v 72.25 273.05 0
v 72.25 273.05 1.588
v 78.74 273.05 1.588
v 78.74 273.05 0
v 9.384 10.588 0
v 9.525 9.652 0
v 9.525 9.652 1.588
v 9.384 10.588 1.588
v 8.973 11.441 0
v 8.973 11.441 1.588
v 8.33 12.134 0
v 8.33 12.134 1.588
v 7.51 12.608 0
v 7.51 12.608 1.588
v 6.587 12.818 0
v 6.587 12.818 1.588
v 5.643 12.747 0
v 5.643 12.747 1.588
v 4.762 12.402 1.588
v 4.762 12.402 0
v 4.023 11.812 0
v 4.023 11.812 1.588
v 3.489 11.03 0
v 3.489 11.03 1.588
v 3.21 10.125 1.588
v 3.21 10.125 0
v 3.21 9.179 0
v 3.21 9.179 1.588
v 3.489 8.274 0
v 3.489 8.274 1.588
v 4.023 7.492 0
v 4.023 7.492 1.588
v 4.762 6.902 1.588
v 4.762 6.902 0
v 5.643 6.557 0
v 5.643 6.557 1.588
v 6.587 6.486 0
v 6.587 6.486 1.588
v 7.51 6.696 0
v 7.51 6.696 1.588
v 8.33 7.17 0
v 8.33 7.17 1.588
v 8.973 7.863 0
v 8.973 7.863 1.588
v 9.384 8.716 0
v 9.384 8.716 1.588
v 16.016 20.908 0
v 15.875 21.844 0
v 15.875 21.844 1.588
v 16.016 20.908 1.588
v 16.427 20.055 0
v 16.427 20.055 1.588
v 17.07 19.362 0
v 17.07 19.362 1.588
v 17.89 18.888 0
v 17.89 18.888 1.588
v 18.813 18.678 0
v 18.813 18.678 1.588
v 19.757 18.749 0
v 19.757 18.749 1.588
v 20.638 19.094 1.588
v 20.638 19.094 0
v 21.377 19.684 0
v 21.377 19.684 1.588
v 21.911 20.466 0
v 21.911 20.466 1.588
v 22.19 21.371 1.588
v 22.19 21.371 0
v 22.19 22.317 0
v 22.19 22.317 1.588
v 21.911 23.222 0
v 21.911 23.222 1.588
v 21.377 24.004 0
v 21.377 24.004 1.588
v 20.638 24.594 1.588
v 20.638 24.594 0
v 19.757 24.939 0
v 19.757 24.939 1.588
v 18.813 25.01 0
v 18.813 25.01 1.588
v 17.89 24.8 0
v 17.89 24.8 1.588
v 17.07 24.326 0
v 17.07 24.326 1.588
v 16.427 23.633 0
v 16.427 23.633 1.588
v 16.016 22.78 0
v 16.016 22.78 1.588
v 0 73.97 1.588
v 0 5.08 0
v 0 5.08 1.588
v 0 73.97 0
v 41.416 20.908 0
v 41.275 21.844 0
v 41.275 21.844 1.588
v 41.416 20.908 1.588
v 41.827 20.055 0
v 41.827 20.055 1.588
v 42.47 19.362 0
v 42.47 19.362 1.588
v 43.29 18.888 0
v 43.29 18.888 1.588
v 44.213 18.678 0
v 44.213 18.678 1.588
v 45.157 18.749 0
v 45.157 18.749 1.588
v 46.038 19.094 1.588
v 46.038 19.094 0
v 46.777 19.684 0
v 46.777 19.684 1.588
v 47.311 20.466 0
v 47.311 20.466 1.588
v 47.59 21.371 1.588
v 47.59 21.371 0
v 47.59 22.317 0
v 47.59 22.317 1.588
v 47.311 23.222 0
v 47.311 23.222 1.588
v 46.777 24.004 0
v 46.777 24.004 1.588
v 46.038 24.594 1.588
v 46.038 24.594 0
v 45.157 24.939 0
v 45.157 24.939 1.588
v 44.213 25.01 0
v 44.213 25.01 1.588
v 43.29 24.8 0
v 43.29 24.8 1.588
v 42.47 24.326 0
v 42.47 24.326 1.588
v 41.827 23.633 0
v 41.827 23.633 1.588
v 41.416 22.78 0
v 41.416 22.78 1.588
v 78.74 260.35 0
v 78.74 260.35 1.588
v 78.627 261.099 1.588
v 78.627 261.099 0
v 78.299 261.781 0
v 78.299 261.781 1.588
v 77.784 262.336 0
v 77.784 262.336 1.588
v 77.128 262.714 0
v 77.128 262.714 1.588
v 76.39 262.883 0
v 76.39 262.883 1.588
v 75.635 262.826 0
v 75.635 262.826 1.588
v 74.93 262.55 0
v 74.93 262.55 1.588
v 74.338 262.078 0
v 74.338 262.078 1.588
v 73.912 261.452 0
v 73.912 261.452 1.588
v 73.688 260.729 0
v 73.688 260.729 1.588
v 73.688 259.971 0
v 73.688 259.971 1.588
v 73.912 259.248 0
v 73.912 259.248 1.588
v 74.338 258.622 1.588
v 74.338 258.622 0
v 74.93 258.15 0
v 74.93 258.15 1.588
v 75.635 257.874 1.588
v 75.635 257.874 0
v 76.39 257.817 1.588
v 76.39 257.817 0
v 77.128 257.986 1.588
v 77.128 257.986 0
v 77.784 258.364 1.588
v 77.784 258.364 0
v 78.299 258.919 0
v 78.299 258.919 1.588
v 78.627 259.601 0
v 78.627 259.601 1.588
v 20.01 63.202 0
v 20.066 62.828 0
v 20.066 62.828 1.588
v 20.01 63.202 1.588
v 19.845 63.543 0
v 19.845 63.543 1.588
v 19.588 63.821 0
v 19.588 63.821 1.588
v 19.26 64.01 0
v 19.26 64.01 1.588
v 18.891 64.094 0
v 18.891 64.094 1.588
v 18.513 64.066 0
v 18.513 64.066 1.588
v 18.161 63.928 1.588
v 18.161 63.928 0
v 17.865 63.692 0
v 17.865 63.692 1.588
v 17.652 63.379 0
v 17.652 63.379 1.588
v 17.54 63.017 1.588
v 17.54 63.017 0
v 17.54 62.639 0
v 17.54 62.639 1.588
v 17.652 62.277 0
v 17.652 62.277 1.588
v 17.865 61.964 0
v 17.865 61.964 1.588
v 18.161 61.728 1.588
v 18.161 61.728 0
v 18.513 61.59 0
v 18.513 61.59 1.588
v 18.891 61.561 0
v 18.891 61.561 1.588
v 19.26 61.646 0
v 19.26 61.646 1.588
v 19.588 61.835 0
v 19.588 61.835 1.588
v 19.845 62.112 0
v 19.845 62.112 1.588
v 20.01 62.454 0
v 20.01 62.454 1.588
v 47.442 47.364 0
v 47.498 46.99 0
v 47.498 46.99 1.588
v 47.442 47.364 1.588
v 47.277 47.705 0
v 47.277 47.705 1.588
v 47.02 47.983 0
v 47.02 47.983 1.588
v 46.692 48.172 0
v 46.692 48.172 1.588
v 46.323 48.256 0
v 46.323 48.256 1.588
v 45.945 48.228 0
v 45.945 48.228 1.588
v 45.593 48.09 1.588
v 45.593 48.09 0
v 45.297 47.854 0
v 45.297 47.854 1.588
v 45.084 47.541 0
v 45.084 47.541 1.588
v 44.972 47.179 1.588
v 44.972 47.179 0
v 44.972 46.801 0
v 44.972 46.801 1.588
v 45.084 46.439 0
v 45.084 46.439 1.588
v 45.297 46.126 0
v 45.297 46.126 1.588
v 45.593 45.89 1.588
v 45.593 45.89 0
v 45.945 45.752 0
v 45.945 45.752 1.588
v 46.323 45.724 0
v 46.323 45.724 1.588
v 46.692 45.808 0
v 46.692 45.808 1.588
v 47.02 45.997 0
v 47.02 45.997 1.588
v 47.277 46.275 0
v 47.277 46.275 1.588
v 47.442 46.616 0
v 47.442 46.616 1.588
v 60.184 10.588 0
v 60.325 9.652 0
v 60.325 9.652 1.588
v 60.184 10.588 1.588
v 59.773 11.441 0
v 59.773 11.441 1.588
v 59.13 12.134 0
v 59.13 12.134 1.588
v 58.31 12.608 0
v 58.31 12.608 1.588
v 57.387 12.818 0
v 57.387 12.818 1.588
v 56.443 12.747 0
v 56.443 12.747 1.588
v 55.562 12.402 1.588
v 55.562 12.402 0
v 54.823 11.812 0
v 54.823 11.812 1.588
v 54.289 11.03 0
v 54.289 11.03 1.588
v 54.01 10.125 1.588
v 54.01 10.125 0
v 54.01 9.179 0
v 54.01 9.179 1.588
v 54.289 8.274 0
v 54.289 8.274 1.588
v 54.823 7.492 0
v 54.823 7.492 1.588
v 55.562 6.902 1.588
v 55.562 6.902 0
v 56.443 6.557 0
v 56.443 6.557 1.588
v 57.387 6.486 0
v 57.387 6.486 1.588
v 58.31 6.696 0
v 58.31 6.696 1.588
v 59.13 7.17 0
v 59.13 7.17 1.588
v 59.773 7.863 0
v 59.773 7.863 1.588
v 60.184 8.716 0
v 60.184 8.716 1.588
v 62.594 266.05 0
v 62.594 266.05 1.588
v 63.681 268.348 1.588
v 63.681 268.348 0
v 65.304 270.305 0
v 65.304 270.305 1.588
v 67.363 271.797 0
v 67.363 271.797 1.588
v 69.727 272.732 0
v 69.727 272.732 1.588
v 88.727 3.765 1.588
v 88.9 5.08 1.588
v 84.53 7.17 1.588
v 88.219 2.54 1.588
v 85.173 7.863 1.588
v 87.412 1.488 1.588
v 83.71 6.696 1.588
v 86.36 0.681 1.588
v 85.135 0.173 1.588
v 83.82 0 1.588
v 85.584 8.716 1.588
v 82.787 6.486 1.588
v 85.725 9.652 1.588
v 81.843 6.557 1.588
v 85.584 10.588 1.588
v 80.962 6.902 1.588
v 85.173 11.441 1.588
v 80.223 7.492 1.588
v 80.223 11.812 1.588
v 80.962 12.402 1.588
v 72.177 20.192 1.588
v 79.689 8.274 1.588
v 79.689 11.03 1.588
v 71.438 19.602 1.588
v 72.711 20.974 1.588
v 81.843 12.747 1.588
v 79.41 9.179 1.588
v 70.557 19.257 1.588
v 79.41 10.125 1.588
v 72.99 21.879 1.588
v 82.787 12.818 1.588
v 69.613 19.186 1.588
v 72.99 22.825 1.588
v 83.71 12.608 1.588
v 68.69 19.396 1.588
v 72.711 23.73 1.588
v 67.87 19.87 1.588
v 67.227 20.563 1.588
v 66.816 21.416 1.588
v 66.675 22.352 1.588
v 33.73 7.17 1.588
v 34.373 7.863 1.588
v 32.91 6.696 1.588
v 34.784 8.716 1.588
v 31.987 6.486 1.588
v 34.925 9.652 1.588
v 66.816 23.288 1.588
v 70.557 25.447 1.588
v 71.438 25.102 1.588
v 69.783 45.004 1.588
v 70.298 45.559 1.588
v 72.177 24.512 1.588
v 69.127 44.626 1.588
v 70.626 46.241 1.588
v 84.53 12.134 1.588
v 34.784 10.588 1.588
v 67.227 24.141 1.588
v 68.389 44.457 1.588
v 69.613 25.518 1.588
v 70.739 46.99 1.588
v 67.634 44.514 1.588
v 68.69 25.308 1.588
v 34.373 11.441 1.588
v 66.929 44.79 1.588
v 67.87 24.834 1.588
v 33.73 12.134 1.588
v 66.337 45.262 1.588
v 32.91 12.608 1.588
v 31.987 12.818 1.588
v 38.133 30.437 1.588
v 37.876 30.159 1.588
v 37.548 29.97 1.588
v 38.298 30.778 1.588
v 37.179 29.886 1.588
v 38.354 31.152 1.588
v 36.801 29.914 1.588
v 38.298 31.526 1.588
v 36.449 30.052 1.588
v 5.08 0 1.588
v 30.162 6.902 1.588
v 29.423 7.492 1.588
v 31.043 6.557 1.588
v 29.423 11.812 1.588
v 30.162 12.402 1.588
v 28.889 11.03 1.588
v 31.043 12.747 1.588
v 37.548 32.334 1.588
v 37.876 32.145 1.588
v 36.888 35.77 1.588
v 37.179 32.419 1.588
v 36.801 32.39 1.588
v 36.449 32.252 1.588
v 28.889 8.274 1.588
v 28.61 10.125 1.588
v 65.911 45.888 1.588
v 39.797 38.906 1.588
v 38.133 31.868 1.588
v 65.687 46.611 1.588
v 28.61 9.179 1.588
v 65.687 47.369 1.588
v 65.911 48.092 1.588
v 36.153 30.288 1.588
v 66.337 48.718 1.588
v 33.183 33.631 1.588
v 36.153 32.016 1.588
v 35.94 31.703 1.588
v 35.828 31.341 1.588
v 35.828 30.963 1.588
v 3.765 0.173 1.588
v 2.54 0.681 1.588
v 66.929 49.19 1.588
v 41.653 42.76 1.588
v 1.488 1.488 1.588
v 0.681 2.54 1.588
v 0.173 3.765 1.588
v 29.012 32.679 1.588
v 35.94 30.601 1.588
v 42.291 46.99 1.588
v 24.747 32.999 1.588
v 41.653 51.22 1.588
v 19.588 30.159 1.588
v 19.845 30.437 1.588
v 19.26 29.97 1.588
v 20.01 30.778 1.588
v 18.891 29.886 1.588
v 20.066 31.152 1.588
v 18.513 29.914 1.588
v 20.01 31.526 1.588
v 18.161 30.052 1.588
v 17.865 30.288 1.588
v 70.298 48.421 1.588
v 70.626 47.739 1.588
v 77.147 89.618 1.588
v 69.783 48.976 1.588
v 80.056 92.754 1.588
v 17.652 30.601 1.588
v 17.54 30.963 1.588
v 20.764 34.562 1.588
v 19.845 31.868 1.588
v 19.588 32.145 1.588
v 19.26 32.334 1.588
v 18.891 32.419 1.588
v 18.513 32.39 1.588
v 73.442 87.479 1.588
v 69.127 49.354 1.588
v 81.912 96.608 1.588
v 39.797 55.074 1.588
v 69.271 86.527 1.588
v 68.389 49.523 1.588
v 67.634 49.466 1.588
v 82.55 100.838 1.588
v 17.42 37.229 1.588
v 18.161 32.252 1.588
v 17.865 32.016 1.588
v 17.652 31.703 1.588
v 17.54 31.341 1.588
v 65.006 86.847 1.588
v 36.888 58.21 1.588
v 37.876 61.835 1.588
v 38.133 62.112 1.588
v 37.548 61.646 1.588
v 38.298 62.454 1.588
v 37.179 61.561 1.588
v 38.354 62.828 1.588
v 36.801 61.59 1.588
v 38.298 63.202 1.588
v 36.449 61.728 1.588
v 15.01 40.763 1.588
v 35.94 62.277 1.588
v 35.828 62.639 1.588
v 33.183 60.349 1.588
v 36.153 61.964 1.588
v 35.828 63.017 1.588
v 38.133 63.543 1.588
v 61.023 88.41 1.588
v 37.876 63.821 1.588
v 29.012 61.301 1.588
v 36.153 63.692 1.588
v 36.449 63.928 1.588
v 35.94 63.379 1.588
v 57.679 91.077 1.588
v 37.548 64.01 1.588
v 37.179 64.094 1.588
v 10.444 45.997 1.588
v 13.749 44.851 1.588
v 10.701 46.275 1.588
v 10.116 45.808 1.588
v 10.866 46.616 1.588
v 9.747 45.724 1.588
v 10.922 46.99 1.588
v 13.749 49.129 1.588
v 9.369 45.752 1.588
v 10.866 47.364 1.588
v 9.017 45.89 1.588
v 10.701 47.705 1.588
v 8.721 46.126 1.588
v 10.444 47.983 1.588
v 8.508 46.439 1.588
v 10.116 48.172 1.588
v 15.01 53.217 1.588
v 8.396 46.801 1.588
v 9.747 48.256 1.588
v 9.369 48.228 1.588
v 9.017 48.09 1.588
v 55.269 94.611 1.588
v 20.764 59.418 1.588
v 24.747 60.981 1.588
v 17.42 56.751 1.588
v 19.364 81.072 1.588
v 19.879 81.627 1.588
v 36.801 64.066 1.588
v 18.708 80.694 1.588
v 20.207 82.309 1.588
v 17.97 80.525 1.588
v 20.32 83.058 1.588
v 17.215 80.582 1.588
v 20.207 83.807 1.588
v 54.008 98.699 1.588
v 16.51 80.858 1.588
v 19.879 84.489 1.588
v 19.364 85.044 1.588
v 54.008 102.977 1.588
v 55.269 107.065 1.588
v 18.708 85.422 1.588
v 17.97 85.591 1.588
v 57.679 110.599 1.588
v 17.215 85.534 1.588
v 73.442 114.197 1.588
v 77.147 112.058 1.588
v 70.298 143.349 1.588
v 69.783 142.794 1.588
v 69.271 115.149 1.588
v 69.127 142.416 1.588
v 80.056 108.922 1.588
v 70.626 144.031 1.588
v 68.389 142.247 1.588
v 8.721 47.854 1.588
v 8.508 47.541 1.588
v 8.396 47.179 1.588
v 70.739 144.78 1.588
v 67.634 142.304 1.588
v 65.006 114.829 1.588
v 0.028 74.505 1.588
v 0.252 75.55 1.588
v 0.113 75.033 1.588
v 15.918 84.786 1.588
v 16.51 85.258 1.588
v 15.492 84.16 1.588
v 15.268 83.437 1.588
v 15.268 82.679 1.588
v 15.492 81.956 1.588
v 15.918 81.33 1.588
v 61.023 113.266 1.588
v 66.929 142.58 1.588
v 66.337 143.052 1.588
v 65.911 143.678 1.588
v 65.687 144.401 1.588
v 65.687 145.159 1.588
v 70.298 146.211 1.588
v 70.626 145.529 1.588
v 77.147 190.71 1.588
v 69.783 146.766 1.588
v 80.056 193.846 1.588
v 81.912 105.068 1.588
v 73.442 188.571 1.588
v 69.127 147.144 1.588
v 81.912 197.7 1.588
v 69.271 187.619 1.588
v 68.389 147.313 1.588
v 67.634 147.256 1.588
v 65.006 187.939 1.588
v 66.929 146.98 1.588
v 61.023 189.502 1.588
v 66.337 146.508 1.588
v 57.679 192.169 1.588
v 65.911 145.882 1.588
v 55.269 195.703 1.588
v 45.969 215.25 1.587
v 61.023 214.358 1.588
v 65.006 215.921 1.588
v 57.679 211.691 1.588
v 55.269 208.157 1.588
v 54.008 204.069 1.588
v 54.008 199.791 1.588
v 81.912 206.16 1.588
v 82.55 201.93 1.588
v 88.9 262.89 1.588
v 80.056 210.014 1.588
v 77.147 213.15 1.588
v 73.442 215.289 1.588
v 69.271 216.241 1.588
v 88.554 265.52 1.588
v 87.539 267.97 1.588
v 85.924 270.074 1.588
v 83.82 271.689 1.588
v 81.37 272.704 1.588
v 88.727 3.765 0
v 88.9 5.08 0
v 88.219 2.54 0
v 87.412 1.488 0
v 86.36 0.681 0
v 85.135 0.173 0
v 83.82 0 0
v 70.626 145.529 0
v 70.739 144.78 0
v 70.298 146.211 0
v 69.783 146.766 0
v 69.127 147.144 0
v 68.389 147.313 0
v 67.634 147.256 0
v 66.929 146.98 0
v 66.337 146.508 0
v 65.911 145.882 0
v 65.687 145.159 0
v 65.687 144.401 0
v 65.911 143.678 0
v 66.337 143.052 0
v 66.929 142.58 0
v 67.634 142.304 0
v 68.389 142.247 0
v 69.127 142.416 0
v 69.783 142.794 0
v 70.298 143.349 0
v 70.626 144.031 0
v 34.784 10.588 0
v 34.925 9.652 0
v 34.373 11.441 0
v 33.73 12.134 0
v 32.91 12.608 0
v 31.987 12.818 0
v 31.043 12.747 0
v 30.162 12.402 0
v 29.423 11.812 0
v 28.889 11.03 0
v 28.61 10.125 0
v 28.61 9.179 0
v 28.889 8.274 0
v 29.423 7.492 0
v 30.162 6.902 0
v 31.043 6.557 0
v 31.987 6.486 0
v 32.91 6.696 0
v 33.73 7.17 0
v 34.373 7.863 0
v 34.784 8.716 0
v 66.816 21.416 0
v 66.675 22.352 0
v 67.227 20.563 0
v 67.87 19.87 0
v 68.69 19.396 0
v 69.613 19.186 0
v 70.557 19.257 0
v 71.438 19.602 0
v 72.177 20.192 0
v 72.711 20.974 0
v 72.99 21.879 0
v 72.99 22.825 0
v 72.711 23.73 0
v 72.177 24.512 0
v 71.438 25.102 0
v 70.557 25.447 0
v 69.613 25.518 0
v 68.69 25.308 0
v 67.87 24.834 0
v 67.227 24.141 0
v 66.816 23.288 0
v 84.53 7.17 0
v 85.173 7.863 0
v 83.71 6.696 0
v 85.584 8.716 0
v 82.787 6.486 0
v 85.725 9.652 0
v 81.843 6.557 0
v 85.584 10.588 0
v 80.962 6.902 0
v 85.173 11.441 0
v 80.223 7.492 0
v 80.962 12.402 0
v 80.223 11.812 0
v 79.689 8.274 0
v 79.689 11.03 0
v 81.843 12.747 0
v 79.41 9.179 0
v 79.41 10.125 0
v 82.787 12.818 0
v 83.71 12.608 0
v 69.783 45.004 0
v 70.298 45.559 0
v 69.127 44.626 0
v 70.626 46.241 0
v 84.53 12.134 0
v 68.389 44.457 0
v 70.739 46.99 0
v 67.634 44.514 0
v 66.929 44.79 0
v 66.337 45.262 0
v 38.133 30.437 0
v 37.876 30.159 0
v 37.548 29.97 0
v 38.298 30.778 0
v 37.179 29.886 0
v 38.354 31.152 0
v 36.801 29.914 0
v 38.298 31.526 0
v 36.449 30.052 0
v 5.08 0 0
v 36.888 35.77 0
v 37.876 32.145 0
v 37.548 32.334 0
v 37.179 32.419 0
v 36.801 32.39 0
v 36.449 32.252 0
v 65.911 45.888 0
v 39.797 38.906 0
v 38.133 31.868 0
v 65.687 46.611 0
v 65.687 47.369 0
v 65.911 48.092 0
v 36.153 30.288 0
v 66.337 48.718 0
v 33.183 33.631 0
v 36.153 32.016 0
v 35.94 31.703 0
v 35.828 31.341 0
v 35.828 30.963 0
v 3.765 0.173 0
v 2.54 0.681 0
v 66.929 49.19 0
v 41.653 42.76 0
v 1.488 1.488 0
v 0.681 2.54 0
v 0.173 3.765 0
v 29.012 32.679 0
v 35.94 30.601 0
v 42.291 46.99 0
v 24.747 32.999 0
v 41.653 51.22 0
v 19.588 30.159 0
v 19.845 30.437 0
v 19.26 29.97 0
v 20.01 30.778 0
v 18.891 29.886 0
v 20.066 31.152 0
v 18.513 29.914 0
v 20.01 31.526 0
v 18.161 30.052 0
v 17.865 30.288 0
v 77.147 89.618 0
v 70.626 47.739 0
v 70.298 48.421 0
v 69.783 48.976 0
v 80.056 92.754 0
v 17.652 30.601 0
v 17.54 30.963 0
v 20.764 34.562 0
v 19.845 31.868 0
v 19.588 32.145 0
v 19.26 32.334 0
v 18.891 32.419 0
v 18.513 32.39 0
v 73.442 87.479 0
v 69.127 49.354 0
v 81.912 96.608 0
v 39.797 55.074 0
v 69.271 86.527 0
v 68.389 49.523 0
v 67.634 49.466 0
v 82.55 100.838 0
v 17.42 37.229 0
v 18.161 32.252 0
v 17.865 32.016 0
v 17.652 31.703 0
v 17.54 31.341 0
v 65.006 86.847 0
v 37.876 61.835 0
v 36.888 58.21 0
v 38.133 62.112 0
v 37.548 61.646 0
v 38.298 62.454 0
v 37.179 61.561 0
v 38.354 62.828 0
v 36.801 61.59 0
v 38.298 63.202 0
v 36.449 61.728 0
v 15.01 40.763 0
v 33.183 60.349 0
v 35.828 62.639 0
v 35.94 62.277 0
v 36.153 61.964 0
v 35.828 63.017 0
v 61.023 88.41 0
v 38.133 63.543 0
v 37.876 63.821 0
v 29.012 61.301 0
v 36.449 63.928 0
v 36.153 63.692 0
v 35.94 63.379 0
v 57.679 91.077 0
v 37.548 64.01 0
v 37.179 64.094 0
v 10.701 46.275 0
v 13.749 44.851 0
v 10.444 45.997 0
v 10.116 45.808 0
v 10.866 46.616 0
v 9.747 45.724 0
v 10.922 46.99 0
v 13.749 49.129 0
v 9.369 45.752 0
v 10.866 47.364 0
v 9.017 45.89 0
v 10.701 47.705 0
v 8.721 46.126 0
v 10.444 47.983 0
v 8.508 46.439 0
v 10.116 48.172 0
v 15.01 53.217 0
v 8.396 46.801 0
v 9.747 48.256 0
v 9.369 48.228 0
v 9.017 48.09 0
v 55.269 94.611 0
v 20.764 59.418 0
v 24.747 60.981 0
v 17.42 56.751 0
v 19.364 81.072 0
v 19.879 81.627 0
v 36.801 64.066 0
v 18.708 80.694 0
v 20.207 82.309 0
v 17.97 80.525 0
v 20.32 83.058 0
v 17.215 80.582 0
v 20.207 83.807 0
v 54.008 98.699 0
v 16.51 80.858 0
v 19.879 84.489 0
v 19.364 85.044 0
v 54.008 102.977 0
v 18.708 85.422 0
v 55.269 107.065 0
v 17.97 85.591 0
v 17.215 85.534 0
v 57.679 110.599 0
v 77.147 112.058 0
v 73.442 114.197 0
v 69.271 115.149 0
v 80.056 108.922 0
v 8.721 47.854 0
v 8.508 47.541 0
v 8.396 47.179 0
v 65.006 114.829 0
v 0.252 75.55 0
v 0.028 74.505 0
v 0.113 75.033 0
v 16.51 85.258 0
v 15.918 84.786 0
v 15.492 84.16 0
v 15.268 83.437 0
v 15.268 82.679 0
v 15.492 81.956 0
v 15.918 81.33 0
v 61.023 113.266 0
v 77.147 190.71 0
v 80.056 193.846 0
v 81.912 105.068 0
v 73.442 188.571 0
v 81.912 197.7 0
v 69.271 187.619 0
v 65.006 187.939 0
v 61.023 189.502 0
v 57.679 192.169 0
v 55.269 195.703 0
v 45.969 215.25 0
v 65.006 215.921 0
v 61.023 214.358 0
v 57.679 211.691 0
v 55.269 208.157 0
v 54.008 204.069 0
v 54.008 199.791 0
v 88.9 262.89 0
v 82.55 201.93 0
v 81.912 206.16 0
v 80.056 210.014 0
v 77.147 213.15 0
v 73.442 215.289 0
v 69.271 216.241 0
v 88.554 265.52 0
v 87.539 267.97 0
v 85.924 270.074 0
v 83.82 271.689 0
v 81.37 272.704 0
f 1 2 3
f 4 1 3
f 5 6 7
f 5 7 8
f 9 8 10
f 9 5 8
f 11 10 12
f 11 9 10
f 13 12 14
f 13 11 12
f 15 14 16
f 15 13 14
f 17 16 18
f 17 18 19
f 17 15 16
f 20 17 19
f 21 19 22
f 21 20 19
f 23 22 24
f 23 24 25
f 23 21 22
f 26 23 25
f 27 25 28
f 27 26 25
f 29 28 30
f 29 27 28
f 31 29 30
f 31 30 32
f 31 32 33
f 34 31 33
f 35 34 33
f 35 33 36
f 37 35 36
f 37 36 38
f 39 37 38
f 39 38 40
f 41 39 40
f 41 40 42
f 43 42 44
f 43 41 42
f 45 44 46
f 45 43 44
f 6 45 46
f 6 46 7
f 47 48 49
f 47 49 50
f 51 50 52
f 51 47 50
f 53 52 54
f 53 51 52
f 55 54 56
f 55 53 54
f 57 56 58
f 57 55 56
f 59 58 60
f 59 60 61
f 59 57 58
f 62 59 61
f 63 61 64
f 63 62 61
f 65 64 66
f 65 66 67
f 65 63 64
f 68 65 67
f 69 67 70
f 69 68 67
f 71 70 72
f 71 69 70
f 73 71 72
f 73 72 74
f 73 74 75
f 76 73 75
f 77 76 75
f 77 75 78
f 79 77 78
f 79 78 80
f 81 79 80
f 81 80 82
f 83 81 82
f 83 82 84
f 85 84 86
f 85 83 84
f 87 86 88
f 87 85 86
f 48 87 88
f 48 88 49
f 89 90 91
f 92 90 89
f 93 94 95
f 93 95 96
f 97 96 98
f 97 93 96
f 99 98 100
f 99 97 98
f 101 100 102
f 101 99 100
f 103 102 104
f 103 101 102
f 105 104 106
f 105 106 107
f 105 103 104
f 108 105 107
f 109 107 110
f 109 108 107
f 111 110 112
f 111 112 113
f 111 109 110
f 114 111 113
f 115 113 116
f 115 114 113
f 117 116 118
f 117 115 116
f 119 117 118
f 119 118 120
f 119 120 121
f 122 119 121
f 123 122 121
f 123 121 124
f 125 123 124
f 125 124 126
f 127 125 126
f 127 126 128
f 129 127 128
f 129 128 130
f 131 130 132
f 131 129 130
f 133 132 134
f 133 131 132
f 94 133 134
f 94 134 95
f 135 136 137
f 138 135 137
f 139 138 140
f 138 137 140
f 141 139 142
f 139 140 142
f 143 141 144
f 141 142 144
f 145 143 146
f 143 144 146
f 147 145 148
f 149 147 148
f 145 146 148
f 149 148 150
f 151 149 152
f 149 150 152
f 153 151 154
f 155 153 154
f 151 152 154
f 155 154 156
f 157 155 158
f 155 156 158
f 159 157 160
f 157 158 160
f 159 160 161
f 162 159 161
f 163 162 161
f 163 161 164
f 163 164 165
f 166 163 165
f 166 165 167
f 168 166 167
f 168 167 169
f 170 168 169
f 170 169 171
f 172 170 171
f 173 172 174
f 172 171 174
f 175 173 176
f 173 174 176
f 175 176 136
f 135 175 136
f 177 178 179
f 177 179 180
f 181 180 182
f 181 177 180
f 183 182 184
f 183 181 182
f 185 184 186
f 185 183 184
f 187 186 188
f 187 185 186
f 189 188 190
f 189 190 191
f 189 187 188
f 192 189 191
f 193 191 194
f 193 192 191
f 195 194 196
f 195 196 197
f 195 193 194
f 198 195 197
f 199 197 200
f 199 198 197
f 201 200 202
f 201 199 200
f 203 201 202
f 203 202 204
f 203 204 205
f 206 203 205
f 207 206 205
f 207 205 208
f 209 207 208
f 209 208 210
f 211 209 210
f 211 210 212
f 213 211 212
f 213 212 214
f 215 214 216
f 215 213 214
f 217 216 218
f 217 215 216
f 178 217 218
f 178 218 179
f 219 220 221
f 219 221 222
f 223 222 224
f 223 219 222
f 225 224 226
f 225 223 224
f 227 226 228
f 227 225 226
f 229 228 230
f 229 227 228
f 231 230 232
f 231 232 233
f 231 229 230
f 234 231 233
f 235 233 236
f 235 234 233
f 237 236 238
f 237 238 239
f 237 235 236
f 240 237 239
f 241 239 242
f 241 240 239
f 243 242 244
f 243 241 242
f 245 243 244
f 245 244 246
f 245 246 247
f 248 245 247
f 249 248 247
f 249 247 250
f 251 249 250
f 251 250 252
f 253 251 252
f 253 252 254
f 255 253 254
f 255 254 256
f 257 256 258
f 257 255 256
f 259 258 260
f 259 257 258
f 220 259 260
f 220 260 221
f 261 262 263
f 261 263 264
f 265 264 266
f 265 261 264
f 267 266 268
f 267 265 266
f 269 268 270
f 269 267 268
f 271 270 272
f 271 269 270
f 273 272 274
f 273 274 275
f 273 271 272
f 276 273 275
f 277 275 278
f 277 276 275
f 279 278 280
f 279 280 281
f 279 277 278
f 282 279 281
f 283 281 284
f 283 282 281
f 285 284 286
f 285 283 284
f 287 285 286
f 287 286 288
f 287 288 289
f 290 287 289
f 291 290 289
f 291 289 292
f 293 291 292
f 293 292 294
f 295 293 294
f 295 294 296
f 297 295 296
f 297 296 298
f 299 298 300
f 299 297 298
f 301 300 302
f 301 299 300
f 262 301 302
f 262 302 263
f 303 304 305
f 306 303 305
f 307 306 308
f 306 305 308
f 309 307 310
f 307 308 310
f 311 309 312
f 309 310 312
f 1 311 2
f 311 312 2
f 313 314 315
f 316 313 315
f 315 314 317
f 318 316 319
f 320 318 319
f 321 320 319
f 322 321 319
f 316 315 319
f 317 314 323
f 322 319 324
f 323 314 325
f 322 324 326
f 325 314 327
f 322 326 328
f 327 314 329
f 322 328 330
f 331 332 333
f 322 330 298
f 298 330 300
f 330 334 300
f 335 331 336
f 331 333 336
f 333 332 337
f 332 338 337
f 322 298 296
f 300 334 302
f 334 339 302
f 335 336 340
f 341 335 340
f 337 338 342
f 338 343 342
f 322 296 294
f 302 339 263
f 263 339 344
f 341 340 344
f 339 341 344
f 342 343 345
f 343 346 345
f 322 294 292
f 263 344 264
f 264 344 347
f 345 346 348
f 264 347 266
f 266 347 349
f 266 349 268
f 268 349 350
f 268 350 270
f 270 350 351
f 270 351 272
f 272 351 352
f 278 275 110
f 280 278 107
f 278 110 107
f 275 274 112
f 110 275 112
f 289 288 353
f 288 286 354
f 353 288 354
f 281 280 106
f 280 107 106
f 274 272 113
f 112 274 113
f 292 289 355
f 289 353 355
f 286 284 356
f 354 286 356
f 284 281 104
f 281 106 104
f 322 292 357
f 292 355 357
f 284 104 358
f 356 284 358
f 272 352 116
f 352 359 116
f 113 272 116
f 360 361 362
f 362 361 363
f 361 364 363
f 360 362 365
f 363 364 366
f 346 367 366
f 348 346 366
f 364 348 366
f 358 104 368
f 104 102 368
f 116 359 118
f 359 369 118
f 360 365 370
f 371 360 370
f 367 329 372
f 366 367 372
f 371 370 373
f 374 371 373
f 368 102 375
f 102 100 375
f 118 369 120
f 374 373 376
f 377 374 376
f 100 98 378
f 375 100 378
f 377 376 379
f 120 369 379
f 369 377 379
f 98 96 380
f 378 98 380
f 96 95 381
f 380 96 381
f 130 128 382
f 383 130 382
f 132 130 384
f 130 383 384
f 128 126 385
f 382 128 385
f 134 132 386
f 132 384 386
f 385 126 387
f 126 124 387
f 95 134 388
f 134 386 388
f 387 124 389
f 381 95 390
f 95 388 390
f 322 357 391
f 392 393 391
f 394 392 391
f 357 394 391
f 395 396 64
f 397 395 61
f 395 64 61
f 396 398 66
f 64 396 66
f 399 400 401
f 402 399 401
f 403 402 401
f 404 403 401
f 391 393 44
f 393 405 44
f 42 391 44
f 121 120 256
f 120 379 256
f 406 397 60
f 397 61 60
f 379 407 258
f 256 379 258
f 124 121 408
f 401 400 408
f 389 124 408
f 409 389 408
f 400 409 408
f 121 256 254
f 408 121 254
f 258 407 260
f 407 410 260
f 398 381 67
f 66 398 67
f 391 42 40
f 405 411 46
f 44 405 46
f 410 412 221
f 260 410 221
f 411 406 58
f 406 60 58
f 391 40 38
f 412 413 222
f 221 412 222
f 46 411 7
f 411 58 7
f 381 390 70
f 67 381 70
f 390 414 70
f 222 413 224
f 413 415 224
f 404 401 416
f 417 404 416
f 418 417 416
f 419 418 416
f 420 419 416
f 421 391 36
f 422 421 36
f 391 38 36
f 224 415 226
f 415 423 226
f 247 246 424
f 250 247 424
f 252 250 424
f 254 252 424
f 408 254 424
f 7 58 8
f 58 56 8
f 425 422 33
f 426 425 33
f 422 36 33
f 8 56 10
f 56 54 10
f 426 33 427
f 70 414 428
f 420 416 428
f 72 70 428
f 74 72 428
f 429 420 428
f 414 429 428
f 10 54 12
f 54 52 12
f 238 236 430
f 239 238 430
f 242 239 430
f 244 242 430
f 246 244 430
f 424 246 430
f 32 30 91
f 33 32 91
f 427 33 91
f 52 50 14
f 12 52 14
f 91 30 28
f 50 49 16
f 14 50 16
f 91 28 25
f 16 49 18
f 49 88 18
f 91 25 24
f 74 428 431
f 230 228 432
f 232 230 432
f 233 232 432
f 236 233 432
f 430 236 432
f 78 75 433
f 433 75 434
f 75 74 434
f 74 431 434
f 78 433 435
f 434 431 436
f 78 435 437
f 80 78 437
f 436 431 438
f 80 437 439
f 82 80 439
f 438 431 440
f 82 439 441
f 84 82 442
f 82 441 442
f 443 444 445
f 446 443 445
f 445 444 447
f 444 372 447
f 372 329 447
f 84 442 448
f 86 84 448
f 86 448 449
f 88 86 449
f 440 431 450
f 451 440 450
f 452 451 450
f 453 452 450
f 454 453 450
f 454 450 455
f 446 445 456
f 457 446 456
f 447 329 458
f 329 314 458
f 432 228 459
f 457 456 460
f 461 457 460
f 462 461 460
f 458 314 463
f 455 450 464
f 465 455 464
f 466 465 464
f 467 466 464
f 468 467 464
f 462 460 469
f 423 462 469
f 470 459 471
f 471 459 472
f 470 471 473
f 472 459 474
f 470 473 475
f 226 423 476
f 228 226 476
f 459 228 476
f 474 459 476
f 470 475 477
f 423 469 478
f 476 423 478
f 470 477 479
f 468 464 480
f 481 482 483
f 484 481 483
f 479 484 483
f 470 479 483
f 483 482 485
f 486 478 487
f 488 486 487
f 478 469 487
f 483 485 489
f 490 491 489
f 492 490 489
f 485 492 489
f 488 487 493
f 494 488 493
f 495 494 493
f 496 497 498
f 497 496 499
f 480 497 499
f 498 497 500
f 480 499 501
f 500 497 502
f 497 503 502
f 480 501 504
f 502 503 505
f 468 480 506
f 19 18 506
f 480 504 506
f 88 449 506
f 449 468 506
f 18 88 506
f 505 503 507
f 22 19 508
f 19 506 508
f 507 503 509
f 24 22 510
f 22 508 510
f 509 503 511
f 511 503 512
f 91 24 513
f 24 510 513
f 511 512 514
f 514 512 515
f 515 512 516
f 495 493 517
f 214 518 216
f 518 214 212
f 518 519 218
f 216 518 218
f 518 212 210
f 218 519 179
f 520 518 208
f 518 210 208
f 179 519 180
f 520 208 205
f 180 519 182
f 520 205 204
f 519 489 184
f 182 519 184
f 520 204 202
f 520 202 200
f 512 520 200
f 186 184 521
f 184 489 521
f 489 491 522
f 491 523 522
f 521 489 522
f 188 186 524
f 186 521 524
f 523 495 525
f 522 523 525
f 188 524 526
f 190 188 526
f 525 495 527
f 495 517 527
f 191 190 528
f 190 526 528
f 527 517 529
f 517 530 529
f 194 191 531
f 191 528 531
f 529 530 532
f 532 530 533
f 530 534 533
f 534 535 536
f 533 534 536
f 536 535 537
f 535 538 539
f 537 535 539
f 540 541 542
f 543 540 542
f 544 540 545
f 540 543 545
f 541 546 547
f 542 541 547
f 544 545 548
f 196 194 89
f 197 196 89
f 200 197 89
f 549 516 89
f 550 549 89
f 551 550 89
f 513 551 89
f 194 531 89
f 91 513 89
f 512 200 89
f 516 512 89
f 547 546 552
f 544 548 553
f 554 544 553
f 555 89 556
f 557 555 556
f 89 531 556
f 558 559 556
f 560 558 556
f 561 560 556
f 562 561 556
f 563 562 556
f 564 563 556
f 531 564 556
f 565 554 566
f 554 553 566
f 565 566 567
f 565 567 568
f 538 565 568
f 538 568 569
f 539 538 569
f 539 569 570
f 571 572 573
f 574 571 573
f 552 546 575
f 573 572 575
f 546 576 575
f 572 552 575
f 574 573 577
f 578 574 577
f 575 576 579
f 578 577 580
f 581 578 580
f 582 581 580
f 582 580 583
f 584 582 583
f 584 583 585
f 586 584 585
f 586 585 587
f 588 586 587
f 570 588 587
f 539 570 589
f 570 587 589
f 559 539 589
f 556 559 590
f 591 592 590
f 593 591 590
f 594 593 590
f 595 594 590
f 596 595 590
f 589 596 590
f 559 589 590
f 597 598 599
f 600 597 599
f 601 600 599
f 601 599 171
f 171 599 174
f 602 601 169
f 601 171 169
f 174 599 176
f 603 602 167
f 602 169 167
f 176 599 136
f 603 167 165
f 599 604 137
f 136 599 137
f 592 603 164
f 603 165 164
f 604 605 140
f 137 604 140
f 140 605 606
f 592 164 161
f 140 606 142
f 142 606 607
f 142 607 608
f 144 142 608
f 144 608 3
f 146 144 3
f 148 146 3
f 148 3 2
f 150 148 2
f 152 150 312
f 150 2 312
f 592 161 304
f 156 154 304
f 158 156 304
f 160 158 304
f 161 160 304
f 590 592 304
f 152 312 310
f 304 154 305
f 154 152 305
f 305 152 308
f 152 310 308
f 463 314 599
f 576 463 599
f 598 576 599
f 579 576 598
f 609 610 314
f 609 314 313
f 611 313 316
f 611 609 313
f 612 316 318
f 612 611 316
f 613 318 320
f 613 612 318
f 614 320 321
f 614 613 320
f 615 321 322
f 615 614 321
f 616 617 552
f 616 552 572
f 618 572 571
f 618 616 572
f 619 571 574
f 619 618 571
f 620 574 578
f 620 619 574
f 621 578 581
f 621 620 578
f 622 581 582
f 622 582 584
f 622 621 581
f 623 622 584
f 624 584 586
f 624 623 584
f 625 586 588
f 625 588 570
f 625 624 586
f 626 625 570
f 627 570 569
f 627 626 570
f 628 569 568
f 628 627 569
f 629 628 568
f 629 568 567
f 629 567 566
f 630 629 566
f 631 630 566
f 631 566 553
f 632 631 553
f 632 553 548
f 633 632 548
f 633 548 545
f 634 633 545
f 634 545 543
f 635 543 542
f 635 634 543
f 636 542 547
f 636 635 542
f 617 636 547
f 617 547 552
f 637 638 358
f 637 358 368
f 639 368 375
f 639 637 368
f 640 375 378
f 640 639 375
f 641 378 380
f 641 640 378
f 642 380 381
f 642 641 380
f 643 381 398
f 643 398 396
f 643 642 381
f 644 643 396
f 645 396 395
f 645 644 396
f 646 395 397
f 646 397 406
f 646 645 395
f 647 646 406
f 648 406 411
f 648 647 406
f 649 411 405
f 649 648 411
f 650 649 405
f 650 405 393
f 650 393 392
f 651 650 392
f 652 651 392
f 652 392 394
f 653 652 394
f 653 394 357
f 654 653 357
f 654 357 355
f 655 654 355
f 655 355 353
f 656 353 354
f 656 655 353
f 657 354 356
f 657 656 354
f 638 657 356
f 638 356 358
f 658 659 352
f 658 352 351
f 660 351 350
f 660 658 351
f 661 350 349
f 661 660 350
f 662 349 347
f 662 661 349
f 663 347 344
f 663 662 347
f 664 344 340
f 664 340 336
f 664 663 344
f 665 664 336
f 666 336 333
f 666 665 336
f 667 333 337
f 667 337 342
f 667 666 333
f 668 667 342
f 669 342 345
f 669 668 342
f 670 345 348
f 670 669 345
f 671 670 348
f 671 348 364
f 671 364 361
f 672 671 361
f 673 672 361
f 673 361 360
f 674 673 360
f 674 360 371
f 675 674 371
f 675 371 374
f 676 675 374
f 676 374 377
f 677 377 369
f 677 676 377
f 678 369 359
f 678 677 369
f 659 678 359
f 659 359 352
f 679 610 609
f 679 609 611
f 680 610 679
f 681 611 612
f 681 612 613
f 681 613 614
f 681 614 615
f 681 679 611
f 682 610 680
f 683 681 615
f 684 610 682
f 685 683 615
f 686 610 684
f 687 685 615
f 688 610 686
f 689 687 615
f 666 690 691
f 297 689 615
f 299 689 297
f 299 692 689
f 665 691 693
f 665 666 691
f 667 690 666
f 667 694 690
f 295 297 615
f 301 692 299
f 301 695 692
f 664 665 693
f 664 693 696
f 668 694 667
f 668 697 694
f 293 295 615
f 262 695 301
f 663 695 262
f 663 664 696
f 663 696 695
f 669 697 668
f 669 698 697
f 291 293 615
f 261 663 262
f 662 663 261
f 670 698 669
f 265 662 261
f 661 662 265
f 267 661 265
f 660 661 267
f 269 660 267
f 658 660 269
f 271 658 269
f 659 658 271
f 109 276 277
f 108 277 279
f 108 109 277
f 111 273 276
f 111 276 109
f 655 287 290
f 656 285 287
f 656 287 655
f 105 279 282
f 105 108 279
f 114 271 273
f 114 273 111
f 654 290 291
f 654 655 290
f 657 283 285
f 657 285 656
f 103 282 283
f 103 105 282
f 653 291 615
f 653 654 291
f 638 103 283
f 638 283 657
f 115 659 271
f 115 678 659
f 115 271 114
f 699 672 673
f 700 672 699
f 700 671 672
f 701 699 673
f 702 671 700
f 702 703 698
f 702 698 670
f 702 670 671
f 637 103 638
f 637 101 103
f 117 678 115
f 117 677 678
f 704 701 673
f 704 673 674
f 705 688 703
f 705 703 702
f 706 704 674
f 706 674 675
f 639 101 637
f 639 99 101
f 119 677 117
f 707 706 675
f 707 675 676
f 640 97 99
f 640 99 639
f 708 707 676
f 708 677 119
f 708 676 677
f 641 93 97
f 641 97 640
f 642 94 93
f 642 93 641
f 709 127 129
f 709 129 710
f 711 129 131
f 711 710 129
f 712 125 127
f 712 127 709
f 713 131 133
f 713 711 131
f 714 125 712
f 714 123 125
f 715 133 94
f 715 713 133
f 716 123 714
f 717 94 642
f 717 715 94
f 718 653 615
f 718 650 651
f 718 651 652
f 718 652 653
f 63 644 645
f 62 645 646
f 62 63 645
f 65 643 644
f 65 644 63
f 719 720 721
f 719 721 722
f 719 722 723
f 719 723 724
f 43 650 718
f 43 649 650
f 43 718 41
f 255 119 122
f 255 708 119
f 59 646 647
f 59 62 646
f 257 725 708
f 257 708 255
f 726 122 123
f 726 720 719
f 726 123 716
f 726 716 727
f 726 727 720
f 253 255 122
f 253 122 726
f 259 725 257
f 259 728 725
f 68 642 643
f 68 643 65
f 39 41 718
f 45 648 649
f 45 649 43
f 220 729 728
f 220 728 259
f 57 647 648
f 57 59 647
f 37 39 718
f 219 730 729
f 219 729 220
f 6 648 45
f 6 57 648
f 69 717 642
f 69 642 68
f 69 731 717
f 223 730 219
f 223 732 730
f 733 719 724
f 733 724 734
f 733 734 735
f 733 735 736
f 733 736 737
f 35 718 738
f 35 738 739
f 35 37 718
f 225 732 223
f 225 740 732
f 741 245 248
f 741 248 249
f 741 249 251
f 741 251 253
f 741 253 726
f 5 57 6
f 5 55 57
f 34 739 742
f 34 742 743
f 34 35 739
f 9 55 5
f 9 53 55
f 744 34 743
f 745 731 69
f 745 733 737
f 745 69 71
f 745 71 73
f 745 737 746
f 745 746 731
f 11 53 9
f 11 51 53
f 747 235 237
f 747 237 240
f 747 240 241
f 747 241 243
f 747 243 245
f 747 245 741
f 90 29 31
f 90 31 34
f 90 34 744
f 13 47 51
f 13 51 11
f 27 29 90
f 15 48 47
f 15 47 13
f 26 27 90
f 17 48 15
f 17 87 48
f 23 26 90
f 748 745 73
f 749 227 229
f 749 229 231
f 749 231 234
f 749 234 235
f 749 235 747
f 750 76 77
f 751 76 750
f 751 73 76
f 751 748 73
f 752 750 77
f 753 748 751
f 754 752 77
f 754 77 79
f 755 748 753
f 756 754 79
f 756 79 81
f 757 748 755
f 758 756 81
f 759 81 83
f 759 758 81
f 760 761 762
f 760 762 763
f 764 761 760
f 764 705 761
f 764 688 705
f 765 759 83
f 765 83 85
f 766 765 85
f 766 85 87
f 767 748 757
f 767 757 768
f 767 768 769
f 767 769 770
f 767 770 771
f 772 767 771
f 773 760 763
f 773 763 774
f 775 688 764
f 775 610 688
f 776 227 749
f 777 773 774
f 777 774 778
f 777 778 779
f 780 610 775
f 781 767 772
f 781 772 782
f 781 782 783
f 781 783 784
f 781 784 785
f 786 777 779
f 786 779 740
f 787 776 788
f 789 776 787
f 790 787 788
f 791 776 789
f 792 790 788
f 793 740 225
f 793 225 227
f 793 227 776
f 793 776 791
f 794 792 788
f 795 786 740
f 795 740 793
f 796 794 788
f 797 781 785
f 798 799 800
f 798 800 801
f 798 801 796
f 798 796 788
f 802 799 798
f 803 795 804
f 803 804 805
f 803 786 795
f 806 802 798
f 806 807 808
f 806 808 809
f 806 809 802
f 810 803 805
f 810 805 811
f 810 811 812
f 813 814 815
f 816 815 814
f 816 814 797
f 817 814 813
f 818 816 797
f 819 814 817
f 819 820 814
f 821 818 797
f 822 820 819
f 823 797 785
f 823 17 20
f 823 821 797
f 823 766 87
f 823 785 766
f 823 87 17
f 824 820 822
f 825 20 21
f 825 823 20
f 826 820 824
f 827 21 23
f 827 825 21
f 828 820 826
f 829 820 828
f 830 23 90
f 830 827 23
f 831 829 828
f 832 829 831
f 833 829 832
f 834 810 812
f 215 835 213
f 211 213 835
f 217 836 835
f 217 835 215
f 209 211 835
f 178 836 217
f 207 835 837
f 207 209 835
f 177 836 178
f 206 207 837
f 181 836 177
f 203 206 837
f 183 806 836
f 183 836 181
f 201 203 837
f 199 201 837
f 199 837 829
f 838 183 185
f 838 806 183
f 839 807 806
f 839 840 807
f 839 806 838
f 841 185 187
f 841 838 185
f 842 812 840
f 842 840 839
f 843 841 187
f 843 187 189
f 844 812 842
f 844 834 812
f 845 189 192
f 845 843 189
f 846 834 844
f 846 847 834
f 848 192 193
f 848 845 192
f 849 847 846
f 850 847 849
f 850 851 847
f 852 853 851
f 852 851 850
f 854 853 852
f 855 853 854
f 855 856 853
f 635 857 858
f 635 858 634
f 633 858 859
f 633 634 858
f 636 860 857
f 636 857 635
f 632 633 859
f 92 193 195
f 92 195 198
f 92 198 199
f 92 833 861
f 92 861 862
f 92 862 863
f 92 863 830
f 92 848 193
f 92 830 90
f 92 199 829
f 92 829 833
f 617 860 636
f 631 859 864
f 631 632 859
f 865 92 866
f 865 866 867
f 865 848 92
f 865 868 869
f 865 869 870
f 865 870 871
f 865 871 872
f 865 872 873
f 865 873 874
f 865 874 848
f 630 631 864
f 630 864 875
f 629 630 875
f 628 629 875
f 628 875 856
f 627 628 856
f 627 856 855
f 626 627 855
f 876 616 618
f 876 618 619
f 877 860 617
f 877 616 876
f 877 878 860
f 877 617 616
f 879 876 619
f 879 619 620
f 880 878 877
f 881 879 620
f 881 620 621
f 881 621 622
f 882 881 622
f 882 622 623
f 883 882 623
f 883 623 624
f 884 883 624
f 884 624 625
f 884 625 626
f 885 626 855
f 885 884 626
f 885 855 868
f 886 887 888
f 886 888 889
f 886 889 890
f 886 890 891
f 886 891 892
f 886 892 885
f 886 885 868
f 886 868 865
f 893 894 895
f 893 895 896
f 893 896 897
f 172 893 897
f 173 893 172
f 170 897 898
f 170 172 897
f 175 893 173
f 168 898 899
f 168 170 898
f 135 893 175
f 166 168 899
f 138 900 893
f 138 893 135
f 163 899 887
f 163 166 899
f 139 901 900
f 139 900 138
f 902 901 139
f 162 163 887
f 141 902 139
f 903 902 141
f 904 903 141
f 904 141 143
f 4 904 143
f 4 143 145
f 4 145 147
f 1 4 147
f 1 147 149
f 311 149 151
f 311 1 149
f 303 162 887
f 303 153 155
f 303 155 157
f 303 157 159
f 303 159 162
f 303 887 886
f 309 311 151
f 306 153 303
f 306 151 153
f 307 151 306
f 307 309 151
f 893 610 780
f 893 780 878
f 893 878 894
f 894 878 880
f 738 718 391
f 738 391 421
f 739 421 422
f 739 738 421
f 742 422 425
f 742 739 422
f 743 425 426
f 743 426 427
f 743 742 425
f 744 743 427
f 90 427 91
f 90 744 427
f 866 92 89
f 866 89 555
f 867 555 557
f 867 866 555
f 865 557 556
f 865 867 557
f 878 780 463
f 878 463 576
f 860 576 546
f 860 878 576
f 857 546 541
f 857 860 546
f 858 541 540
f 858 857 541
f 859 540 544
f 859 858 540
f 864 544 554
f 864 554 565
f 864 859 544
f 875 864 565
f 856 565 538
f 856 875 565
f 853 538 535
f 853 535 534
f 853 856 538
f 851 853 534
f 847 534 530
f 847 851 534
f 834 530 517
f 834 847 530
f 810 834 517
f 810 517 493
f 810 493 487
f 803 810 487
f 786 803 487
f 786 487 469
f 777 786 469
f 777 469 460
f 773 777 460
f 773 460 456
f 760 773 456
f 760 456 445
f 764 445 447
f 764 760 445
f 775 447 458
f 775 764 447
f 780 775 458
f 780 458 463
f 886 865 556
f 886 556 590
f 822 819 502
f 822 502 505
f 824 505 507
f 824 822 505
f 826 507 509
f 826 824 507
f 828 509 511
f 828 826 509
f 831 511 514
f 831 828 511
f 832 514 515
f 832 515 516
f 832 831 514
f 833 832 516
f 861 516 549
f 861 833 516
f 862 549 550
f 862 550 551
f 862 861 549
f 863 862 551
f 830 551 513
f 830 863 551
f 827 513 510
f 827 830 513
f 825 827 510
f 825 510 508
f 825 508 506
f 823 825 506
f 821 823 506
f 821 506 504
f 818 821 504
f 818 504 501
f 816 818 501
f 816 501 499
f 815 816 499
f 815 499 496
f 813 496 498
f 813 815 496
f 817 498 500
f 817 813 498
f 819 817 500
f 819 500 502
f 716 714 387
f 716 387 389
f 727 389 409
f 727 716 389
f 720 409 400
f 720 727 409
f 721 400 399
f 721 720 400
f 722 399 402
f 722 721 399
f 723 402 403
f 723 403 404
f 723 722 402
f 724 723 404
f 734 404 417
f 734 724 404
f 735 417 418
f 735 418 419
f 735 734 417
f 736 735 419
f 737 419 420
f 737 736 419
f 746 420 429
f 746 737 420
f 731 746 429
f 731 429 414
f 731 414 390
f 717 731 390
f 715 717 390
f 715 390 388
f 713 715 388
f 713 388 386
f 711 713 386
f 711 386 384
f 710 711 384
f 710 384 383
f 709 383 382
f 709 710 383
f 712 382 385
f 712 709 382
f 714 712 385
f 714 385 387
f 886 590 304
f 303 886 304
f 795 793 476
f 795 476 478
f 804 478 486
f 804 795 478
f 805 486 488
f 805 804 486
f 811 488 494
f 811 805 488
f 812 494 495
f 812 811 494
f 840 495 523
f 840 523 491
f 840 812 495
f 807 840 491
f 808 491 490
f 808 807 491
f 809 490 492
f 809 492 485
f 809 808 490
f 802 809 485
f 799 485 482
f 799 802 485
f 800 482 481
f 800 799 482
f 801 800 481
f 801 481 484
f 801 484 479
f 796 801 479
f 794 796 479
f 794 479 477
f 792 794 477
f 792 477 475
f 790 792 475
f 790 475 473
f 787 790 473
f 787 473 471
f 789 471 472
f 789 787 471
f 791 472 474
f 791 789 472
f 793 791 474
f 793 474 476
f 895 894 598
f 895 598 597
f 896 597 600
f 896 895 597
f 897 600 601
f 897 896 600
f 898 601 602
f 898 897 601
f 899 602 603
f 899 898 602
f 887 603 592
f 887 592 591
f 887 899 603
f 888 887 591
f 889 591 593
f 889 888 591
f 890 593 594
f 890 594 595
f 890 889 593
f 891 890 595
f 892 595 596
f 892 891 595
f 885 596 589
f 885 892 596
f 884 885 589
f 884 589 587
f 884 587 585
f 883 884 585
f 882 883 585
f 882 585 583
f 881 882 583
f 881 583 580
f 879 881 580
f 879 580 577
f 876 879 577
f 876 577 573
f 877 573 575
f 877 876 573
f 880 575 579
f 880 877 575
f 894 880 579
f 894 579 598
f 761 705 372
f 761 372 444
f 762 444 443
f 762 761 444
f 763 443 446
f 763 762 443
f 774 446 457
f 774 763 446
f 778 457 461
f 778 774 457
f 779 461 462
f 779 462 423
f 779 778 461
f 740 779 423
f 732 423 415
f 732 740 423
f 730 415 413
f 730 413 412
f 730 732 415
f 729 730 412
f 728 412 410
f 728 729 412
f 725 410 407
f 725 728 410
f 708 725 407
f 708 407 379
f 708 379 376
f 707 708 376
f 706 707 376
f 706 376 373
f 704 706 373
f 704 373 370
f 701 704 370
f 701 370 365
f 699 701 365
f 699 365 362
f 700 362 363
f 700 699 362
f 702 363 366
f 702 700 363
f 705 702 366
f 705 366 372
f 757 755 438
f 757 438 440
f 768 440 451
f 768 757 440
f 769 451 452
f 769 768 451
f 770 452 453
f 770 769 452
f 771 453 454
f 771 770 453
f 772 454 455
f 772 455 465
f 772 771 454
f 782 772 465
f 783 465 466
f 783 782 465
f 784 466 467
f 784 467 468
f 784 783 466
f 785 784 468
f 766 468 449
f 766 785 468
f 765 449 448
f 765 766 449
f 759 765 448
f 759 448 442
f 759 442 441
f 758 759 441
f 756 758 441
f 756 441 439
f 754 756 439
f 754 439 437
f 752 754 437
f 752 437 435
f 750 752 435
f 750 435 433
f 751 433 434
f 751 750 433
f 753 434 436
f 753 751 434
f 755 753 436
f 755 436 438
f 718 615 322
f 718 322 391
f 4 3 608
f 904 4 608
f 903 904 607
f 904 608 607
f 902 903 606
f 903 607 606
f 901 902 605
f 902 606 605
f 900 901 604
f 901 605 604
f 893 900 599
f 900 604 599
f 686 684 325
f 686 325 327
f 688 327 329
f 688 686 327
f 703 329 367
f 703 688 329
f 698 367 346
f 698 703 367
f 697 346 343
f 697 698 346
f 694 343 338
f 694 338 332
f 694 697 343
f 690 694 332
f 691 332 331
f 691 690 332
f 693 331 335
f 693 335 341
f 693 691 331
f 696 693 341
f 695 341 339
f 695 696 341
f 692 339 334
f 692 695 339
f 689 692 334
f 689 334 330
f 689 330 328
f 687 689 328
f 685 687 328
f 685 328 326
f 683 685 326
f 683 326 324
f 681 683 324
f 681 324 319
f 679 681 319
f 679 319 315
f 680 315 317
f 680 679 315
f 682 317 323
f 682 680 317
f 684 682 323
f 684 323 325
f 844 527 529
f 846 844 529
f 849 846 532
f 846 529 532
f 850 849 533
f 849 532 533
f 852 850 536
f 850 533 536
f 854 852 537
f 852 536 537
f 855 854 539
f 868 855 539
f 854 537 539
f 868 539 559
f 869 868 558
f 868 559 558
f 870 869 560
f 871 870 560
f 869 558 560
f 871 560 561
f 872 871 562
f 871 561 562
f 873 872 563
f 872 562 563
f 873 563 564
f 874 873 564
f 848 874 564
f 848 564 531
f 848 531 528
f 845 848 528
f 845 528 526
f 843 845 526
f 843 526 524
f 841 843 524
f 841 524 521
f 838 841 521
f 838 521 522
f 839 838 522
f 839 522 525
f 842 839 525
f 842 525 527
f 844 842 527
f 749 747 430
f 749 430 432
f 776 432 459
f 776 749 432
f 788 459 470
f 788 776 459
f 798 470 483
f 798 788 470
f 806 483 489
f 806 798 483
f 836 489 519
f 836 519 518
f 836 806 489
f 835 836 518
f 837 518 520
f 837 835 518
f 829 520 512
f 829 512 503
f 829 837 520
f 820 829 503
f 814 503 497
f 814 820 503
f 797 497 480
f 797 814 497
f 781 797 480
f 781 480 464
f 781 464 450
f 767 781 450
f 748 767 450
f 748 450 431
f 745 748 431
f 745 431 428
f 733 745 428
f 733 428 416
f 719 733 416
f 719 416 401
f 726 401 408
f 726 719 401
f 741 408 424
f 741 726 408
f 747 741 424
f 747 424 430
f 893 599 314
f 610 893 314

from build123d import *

# Parameters (mm, degrees)
SKETCH1_R           = 14.351
SKETCH1_R_2         = 2.54
SKETCH1_R_3         = 3.175
SKETCH1_R_4         = 1.27
BOSS_EXTRUDE1_DEPTH = 1.5875
SKETCH2_R           = 2.54
BOSS_EXTRUDE2_DEPTH = 1.5875
SKETCH3_R           = 2.54
CUT_EXTRUDE1_DEPTH  = 288.162032059


with BuildPart() as part:
    # Sketch1 → Boss-Extrude1 (new body)
    with BuildSketch(Plane.XY):
        with BuildLine():
            Line((88.9, 212.09), (88.9, 5.08))
            ThreePointArc((88.9, 5.08), (87.412102448, 1.487897552), (83.82, 0))
            Line((83.82, 0), (5.08, 0))
            ThreePointArc((5.08, 0), (1.487897552, 1.487897552), (0, 5.08))
            Line((0, 5.08), (0, 73.969993162))
            ThreePointArc((0, 73.969993162), (0.063384098, 74.769971217), (0.25195468, 75.549986324))
            Line((0.25195468, 75.549986324), (45.969223296, 215.249986324))
            ThreePointArc((45.969223296, 215.249986324), (49.662087504, 220.315906061), (55.625313935, 222.25))
            Line((55.625313935, 222.25), (78.74, 222.25))
            ThreePointArc((78.74, 222.25), (85.924204897, 219.274204897), (88.9, 212.09))
        make_face()
        with Locations((68.199, 201.93)):
            Circle(SKETCH1_R, mode=Mode.SUBTRACT)
        with Locations((68.199, 100.838)):
            Circle(SKETCH1_R, mode=Mode.SUBTRACT)
        with Locations((68.199, 144.78)):
            Circle(SKETCH1_R_2, mode=Mode.SUBTRACT)
        with Locations((68.199, 46.99)):
            Circle(SKETCH1_R_2, mode=Mode.SUBTRACT)
        with Locations((27.94, 46.99)):
            Circle(SKETCH1_R, mode=Mode.SUBTRACT)
        with Locations((6.35, 9.652)):
            Circle(SKETCH1_R_3, mode=Mode.SUBTRACT)
        with Locations((31.75, 9.652)):
            Circle(SKETCH1_R_3, mode=Mode.SUBTRACT)
        with Locations((57.15, 9.652)):
            Circle(SKETCH1_R_3, mode=Mode.SUBTRACT)
        with Locations((82.55, 9.652)):
            Circle(SKETCH1_R_3, mode=Mode.SUBTRACT)
        with Locations(Location((69.85, 22.352, 0), (0, 0, 180))):
            Circle(SKETCH1_R_3, mode=Mode.SUBTRACT)
        with Locations(Location((44.45, 21.844, 0), (0, 0, 180))):
            Circle(SKETCH1_R_3, mode=Mode.SUBTRACT)
        with Locations(Location((19.05, 21.844, 0), (0, 0, 180))):
            Circle(SKETCH1_R_3, mode=Mode.SUBTRACT)
        with Locations((46.228, 46.99)):
            Circle(SKETCH1_R_4, mode=Mode.SUBTRACT)
        with Locations((37.084, 31.152127416)):
            Circle(SKETCH1_R_4, mode=Mode.SUBTRACT)
        with Locations((18.796, 31.152127416)):
            Circle(SKETCH1_R_4, mode=Mode.SUBTRACT)
        with Locations((9.652, 46.99)):
            Circle(SKETCH1_R_4, mode=Mode.SUBTRACT)
        with Locations((18.796, 62.827872584)):
            Circle(SKETCH1_R_4, mode=Mode.SUBTRACT)
        with Locations((37.084, 62.827872584)):
            Circle(SKETCH1_R_4, mode=Mode.SUBTRACT)
    extrude(amount=BOSS_EXTRUDE1_DEPTH)

    # Sketch2 → Boss-Extrude2 (add)
    with BuildSketch(Plane.XY.offset(1.5875)):
        with BuildLine():
            Line((45.969223296, 215.249986324), (62.593684611, 266.049986324))
            ThreePointArc((62.593684611, 266.049986324), (66.286548819, 271.115906061), (72.24977525, 273.05))
            Line((72.24977525, 273.05), (78.74, 273.05))
            ThreePointArc((78.74, 273.05), (85.924204897, 270.074204897), (88.9, 262.89))
            Line((88.9, 262.89), (88.9, 212.09))
            Line((88.9, 212.09), (78.74, 222.25))
            Line((78.74, 222.25), (55.625313935, 222.25))
            Line((55.625313935, 222.25), (45.969223296, 215.249986324))
        make_face()
        with Locations((76.2, 260.35)):
            Circle(SKETCH2_R, mode=Mode.SUBTRACT)
    extrude(amount=-BOSS_EXTRUDE2_DEPTH)

    # Sketch3 → Cut-Extrude1 (cut, through all)
    with BuildSketch(Plane.XY.offset(1.5875)):
        with Locations((17.78, 83.058)):
            Circle(SKETCH3_R)
    extrude(amount=-CUT_EXTRUDE1_DEPTH, mode=Mode.SUBTRACT)


solid = part.part
